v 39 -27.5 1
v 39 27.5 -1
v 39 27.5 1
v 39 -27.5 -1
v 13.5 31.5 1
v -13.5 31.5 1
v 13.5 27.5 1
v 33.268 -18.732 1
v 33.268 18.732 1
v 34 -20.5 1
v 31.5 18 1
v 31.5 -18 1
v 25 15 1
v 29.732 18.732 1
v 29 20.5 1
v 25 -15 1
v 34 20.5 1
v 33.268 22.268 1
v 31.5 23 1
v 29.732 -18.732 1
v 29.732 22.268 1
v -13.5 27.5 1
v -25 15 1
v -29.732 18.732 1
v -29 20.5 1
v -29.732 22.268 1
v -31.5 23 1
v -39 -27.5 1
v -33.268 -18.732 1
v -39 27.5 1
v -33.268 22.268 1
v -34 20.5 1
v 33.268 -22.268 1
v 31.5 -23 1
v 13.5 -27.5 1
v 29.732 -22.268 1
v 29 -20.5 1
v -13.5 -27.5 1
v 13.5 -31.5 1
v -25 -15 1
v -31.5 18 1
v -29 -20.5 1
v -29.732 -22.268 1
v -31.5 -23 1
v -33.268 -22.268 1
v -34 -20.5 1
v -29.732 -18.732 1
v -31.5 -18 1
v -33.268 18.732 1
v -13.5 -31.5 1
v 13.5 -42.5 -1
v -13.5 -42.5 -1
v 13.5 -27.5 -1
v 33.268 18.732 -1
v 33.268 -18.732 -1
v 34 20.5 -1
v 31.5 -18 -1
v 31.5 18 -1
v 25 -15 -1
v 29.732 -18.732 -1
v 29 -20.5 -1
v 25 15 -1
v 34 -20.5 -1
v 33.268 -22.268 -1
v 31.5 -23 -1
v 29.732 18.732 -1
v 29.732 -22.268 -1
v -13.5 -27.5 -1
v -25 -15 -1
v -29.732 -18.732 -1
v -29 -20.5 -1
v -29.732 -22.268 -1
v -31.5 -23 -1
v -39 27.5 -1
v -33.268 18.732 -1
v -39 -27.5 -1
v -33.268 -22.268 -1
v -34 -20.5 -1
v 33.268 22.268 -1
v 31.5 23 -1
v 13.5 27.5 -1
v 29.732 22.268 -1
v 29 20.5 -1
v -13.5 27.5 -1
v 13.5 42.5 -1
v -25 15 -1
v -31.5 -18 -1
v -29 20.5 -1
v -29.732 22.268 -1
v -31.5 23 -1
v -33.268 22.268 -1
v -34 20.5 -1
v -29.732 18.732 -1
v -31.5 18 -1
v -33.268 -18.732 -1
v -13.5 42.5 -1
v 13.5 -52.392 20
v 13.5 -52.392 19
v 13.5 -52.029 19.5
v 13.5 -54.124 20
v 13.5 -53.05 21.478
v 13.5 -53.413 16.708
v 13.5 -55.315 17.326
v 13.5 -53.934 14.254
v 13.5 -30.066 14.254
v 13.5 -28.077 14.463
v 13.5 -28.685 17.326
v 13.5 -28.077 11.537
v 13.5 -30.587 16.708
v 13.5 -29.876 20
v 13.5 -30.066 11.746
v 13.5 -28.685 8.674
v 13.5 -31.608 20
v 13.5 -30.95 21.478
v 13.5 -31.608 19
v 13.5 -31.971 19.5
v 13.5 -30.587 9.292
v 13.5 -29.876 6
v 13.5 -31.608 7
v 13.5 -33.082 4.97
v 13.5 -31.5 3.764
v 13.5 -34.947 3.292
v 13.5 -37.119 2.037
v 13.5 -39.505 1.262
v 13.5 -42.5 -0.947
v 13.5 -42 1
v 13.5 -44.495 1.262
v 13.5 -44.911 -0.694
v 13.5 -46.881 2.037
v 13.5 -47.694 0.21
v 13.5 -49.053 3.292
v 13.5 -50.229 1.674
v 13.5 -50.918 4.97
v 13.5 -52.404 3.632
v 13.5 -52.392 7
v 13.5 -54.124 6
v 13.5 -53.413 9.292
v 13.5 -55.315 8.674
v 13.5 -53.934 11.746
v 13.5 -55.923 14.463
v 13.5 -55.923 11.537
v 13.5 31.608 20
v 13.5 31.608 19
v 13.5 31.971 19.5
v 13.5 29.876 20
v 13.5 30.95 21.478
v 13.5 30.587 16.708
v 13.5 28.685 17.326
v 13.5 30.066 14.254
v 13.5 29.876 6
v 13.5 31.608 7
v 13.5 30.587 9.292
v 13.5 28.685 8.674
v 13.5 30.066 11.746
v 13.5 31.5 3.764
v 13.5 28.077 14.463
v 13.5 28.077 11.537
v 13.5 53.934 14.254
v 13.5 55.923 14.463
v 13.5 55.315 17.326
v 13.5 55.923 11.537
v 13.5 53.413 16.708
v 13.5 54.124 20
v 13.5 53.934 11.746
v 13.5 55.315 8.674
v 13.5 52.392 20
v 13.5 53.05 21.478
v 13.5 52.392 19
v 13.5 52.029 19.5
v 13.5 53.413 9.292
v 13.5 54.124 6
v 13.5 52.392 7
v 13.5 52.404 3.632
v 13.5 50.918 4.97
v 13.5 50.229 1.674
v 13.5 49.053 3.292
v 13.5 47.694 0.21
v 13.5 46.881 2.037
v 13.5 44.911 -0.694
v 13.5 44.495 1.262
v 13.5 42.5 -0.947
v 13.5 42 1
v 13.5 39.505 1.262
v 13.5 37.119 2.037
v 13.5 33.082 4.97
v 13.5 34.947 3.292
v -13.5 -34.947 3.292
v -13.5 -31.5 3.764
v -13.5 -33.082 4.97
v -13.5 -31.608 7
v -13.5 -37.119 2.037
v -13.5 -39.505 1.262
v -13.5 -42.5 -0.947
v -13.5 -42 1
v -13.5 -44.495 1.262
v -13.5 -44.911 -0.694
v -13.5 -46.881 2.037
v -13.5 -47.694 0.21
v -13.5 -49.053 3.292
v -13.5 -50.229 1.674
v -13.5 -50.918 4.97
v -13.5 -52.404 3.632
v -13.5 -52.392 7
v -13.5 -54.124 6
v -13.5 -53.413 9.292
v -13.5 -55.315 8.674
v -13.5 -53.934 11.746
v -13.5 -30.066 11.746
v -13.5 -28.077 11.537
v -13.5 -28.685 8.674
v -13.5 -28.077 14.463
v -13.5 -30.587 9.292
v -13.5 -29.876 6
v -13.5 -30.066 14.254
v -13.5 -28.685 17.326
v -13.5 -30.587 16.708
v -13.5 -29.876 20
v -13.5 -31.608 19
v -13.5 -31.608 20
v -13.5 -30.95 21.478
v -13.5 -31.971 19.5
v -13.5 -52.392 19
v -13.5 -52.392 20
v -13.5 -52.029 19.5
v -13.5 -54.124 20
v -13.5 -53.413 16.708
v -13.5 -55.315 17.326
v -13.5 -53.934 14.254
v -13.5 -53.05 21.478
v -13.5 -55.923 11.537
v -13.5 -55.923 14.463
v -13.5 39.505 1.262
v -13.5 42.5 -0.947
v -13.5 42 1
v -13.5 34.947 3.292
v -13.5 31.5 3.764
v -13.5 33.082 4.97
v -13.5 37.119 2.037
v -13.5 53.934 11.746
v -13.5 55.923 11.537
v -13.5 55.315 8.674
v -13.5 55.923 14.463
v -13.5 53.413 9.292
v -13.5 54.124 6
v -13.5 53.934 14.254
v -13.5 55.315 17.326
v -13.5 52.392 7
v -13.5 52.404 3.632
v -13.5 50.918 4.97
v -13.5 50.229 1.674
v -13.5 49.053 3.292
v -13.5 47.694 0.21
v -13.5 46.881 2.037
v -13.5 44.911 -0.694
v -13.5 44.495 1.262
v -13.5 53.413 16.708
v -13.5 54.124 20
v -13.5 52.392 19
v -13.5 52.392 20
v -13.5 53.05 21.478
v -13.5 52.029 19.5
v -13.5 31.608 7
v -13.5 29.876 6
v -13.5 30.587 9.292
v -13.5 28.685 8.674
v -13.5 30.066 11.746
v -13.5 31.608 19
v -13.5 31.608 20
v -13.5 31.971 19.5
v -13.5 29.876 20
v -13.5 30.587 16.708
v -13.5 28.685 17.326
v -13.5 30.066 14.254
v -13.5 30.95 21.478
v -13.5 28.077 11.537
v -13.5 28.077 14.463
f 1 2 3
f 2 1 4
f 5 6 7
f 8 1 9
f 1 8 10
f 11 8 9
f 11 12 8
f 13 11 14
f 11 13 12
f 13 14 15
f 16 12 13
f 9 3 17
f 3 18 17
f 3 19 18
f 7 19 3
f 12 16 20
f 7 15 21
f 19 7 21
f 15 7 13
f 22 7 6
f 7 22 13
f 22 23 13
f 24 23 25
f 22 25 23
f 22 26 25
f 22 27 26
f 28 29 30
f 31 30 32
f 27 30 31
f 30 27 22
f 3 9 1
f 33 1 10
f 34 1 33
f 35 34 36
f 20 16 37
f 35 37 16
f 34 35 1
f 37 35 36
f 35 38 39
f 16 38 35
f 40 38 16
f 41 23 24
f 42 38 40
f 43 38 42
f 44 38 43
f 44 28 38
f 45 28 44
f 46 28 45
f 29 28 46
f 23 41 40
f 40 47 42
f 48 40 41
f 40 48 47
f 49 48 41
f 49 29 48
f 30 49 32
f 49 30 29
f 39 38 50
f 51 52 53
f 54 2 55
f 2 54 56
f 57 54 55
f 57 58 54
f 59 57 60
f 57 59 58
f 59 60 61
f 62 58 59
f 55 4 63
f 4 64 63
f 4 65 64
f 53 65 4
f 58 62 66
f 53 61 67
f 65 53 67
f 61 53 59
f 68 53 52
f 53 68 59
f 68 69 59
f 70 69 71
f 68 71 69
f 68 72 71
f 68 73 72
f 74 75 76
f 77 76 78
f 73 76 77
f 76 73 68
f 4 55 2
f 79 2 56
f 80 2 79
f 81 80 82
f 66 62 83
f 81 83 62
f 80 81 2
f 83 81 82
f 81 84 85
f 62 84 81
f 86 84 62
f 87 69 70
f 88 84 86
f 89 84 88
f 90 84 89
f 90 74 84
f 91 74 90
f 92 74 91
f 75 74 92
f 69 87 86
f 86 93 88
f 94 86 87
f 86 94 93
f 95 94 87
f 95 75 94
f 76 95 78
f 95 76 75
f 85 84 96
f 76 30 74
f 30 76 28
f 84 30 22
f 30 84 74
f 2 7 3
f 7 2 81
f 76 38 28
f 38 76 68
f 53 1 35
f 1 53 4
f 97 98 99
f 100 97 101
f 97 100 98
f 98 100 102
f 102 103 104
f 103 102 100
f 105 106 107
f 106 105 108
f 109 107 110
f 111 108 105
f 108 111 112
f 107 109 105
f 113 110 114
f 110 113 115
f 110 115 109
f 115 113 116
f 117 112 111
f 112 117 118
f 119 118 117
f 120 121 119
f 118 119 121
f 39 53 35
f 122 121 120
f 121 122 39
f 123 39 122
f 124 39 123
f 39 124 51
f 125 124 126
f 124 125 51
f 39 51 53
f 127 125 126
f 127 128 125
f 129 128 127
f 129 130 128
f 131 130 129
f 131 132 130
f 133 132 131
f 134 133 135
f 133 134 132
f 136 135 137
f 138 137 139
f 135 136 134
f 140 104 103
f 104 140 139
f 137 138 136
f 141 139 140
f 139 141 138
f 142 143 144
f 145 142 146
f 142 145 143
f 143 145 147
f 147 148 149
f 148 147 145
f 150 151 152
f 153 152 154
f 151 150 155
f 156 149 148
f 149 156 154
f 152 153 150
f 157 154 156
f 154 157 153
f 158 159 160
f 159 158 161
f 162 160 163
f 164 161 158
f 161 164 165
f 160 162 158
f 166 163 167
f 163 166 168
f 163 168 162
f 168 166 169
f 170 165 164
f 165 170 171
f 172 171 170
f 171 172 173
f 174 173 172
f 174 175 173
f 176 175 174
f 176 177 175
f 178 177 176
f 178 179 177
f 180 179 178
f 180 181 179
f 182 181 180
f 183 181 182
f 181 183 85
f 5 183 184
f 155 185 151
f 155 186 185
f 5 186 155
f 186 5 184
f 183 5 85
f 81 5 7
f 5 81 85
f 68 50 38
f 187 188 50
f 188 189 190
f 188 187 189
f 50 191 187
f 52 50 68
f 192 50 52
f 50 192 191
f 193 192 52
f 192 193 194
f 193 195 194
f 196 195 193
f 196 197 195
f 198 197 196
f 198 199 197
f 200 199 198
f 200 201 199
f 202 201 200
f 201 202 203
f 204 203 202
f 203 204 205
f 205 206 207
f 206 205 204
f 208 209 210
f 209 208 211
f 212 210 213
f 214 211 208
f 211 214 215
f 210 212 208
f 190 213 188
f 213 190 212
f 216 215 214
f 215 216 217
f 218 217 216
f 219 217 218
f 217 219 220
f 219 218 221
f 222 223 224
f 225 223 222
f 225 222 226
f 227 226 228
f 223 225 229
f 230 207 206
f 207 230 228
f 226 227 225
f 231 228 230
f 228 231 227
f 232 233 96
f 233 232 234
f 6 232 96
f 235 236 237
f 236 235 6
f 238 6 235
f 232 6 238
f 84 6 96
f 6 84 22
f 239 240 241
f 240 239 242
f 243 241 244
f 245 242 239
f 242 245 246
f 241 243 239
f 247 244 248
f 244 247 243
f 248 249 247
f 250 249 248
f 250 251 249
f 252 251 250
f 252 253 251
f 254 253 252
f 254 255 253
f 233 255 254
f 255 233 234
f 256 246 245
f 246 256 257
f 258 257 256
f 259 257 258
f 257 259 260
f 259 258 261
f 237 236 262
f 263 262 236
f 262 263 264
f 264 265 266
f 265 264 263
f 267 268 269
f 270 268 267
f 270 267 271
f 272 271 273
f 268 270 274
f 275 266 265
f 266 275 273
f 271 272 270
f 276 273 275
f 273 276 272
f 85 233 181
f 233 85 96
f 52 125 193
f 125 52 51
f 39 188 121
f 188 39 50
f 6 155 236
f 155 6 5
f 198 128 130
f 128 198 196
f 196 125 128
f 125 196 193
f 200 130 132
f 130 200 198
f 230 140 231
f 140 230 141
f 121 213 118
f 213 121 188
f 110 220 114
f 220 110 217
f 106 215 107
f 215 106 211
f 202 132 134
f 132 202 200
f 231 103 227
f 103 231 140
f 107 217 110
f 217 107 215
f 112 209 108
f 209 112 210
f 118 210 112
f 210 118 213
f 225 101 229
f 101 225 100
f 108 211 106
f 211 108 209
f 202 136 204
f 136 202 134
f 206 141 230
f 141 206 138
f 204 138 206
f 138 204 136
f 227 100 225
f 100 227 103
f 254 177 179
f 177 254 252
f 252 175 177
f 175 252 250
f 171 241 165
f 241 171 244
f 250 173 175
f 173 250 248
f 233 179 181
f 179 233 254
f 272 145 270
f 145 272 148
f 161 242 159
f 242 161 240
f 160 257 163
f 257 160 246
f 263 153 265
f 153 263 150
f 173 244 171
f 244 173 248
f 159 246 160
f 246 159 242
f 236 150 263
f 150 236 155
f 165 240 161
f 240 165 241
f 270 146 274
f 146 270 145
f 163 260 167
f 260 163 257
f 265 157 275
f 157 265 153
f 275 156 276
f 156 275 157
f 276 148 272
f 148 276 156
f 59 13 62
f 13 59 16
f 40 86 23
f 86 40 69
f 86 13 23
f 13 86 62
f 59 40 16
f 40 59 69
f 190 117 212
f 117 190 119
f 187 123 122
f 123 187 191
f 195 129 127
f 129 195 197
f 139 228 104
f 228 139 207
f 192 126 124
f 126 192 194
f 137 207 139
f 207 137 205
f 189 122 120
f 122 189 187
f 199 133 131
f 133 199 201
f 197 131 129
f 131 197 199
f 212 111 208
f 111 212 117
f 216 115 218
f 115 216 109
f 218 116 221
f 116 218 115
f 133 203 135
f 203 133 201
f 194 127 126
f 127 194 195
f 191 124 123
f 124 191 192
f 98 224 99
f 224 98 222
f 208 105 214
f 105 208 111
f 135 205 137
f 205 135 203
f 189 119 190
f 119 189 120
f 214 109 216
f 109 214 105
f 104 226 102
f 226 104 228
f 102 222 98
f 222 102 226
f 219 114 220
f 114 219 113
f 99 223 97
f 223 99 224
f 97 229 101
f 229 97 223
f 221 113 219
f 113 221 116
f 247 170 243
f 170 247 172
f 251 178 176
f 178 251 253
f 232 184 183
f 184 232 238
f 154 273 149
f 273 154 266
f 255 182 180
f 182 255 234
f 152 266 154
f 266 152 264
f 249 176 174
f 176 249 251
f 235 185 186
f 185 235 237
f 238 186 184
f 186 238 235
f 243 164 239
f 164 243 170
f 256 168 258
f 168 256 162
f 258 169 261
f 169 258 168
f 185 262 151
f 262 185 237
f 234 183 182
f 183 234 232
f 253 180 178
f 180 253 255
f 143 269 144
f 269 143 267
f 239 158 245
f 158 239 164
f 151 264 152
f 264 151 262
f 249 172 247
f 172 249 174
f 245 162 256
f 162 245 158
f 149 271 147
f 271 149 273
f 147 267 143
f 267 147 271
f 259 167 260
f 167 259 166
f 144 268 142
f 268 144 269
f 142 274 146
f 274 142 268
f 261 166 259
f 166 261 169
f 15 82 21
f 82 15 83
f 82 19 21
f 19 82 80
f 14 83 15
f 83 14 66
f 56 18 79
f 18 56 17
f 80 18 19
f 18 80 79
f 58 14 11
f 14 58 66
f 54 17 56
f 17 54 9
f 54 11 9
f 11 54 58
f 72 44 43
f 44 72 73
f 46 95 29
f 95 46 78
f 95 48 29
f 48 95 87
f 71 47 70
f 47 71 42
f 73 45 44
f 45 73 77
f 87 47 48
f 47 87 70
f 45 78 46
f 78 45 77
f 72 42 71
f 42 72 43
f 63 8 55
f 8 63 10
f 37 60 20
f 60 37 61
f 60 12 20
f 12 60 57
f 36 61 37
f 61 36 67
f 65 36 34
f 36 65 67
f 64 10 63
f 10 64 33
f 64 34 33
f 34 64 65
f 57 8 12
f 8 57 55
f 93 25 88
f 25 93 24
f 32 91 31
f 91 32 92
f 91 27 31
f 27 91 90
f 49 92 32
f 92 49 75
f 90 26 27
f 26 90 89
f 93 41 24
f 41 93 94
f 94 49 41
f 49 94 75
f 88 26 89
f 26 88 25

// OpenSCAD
difference() {
    union() {
        
        cube([78,55,2],true);
        cube([27,85,2],true);
        //cube([4,110,2],true);
        
        translate([0,-34,2])
            cube([27,5,5],true);
        translate([0,34,2])
            cube([27,5,5],true);
        
        translate([0,-42,13])
            rotate([0,90,0])
                cylinder(27,14,14,true);
        translate([0,42,13])
            rotate([0,90,0])
                cylinder(27,14,14,true);
        
     }
            
     union() {
         
         cube([50,30,5],true);
         
         translate([0,-42,13])
            rotate([0,90,0])
                cylinder(30,12,12,true);
        
         translate([0,-42,26])
            rotate([0,90,0])
                cylinder(30,12,12,true);
                

        
         
        translate([0,42,13])
            rotate([0,90,0])
                cylinder(30,12,12,true);
         
        translate([0,42,26])
            rotate([0,90,0])
                cylinder(30,12,12,true);
                
         
         
         
                
        translate([31.5,20.5,0])
            rotate([0,0,90])
                cylinder(22,2.5,2.5,true);
              
        translate([-31.5,-20.5,0])
            rotate([0,0,90])
                cylinder(22,2.5,2.5,true);
                
                
        translate([31.5,-20.5,0])
            rotate([0,0,90])
                cylinder(22,2.5,2.5,true);
                
        translate([-31.5,20.5,0])
            rotate([0,0,90])
                cylinder(22,2.5,2.5,true);
     }
}
